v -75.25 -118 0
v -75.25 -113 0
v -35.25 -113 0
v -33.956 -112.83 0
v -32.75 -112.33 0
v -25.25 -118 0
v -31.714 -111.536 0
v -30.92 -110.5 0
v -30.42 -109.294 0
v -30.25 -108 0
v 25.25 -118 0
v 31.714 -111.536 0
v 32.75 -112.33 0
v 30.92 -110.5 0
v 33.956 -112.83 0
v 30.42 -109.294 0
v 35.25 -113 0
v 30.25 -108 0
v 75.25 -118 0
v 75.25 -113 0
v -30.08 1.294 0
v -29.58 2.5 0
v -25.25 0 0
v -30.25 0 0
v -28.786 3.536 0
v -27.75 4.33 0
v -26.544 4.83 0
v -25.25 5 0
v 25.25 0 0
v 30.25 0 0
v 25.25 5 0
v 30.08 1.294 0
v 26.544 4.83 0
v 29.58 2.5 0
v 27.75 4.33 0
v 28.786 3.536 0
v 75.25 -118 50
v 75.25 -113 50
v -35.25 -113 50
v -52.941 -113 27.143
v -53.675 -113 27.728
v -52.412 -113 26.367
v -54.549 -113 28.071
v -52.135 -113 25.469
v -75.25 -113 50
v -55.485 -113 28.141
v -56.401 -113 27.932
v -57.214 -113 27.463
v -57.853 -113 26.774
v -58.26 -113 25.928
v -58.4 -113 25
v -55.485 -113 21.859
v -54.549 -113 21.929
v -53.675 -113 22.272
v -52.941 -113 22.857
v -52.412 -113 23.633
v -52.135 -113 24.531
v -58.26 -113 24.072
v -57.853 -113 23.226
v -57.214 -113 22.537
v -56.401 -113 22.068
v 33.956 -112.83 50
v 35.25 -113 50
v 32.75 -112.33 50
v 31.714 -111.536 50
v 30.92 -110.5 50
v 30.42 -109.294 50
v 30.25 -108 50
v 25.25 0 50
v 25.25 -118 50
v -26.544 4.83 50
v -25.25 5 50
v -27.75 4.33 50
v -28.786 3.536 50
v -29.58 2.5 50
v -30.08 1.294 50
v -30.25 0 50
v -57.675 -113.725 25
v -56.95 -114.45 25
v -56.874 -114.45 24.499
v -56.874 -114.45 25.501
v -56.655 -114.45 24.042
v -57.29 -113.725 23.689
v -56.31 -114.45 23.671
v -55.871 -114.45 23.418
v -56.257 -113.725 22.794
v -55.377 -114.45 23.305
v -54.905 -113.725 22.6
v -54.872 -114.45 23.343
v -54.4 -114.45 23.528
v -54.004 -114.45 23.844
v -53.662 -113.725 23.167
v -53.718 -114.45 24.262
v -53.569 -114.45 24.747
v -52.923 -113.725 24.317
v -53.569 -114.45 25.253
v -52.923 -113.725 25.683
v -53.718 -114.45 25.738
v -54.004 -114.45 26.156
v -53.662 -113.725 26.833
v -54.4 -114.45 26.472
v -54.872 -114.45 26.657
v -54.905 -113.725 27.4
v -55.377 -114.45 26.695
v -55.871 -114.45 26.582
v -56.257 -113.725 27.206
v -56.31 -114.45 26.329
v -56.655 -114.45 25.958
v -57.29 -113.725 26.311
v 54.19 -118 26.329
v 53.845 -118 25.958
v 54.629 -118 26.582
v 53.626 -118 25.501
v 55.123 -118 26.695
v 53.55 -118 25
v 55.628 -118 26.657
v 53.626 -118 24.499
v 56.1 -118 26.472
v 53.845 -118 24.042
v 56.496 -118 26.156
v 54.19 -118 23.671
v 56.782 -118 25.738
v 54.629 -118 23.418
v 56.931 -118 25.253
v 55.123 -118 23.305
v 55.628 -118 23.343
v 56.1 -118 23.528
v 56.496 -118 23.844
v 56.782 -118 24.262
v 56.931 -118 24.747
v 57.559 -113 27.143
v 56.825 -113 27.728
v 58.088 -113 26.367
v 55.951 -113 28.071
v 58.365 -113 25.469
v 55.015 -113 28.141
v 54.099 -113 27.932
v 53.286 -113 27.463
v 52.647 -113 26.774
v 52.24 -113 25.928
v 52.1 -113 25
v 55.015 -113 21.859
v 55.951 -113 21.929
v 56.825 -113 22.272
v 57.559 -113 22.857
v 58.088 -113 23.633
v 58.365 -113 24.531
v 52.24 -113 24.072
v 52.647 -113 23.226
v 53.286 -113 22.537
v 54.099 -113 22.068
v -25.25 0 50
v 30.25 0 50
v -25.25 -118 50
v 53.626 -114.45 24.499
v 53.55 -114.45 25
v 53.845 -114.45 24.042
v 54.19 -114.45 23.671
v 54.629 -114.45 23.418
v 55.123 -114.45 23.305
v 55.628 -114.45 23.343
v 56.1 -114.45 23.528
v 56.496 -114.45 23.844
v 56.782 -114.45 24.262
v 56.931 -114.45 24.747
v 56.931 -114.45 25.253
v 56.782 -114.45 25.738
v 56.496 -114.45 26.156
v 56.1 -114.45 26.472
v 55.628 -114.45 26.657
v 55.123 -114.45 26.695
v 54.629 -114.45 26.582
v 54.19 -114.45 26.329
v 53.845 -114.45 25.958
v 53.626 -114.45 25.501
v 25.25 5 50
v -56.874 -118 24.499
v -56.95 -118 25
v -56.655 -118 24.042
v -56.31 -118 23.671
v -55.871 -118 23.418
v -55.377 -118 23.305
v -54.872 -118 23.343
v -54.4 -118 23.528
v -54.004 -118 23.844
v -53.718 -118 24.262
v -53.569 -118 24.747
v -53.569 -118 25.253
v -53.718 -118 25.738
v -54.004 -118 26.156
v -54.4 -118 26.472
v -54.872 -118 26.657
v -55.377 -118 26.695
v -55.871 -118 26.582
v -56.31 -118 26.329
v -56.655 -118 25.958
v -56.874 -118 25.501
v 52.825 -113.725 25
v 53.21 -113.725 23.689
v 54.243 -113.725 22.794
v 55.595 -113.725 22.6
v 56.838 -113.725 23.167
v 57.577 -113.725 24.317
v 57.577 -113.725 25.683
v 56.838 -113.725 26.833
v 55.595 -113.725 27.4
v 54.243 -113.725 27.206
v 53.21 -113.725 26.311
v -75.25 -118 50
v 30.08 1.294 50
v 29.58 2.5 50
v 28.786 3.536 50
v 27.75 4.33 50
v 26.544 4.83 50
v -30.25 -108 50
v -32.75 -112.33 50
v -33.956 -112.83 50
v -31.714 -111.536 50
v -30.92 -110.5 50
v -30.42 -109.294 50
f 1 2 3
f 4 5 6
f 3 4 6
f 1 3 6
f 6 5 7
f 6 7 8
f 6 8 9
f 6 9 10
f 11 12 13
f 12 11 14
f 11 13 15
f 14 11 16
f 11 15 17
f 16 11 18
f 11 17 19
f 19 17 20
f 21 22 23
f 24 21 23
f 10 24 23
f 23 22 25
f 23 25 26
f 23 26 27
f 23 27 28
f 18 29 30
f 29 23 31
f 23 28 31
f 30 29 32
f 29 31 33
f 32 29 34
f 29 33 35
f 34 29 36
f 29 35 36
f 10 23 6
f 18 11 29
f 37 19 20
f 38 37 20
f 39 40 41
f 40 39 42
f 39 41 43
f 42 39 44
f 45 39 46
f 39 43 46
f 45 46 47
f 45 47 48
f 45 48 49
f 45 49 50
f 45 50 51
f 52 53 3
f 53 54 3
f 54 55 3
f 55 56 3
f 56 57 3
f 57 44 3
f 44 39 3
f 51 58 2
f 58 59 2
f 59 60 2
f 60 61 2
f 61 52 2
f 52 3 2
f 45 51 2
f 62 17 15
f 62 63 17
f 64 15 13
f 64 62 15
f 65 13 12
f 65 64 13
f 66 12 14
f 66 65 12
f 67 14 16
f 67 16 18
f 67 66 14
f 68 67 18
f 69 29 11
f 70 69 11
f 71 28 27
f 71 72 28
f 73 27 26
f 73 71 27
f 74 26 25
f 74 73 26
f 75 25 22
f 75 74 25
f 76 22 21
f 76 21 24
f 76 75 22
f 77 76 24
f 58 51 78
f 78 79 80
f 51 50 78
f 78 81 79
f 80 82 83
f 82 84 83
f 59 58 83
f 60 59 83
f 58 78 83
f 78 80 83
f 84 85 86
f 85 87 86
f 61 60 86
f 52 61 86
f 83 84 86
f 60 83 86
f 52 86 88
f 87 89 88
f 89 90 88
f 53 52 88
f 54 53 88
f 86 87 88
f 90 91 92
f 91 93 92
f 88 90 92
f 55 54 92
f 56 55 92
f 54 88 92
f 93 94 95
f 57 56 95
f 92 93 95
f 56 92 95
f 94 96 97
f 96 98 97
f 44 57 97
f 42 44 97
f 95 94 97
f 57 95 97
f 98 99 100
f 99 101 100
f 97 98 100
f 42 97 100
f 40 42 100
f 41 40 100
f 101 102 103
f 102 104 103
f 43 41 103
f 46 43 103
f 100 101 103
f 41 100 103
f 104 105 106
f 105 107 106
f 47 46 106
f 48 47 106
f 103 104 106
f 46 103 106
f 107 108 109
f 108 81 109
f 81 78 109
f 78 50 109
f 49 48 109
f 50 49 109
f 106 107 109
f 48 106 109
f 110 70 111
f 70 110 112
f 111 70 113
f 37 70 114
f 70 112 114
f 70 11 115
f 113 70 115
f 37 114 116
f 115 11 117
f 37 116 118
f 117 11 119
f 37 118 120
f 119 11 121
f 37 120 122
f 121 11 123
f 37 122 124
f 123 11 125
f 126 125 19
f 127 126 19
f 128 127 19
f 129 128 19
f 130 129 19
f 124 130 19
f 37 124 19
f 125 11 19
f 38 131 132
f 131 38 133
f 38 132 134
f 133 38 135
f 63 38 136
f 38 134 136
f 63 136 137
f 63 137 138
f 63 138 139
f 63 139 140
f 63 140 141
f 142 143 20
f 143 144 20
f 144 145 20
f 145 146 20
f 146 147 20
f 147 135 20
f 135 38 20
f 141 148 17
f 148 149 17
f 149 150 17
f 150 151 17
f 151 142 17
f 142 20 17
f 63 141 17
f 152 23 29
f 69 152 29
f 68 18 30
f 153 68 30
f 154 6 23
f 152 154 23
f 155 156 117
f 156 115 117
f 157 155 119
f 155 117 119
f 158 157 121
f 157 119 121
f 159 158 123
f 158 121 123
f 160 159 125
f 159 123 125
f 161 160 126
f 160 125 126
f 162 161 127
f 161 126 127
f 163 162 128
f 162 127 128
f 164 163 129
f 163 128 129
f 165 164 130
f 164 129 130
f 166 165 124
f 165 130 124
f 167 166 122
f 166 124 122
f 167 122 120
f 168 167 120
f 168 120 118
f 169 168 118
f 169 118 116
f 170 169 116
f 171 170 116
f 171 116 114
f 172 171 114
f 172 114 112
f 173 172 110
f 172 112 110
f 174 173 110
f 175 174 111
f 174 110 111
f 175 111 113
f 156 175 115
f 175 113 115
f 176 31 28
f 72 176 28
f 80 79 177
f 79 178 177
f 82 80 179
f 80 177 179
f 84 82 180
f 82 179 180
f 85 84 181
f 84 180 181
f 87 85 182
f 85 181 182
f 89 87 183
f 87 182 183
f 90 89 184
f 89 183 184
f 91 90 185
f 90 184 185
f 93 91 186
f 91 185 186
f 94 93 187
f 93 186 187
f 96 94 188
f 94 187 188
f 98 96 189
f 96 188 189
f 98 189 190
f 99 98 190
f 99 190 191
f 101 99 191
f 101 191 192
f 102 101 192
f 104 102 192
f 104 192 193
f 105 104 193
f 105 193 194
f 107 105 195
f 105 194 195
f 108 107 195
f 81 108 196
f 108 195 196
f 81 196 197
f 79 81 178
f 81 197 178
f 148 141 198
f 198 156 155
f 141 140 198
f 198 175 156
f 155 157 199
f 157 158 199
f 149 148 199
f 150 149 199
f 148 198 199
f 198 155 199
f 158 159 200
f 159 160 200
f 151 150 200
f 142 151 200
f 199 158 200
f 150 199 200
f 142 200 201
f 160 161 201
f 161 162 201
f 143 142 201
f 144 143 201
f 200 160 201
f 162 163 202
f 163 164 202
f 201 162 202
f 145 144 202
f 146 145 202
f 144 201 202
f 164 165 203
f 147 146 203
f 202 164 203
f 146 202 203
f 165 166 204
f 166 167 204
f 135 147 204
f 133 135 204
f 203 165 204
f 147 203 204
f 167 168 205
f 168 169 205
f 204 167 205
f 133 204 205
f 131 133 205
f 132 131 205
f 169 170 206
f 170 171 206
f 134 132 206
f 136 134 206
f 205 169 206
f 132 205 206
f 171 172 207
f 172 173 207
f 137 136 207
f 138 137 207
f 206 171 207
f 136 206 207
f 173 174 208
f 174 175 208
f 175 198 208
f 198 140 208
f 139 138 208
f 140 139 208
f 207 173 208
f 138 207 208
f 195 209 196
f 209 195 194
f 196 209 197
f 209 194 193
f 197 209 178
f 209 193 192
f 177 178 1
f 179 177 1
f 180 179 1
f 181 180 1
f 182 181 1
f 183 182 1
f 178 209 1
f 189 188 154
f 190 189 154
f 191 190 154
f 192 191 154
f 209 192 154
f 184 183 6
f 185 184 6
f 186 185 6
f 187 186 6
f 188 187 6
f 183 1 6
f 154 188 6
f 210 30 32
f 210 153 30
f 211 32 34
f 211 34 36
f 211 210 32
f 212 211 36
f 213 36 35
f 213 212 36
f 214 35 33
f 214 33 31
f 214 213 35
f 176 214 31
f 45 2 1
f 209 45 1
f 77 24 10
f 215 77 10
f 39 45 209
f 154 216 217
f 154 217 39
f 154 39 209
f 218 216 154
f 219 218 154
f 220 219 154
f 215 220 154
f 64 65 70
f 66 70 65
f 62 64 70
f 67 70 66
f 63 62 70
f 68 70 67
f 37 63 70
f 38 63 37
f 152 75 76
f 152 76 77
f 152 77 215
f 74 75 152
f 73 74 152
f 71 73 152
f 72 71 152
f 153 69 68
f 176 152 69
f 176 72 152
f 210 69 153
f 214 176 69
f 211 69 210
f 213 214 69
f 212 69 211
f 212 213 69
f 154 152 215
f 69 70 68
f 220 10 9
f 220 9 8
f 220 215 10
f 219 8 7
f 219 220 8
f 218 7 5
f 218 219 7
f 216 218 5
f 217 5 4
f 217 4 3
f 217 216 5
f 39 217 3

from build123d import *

# Parameters (mm, degrees)
BOSS_EXTRU_1_DEPTH                             = 50
CONG_1_R                                       = 5
FRAISAGE_POUR_VIS_T_TE_FRAIS_E_M31_D           = 3.4
FRAISAGE_POUR_VIS_T_TE_FRAIS_E_M31_CSINK_D     = 6.3
FRAISAGE_POUR_VIS_T_TE_FRAIS_E_M31_CSINK_ANGLE = 90


with BuildPart() as part:
    # Esquisse1 → Boss.-Extru.1 (new body)
    with BuildSketch(Plane.XY):
        Polygon((-25.25, 0), (25.25, 0), (25.25, -118), (75.25, -118), (75.25, -113), (30.25, -113), (30.25, 5), (-30.25, 5), (-30.25, -113), (-75.25, -113), (-75.25, -118), (-25.25, -118), align=None)
    extrude(amount=BOSS_EXTRU_1_DEPTH)

    # Congé1
    cong_1_edges = [part.edges().sort_by_distance(p)[0] for p in [
        (-30.25, -113, 25),
        (-30.25, 5, 25),
        (30.25, 5, 25),
        (30.25, -113, 25),
    ]]
    fillet(cong_1_edges, radius=CONG_1_R)

    # Fraisage pour vis à tête fraisée M31 (through all)
    with Locations(Plane(origin=(0, -113, 0), x_dir=(1, 0, 0), z_dir=(0, 1, 0))):
        with Locations((-55.25, -25), (55.25, -25)):
            CounterSinkHole(FRAISAGE_POUR_VIS_T_TE_FRAIS_E_M31_D / 2, FRAISAGE_POUR_VIS_T_TE_FRAIS_E_M31_CSINK_D / 2, counter_sink_angle=FRAISAGE_POUR_VIS_T_TE_FRAIS_E_M31_CSINK_ANGLE)


solid = part.part
